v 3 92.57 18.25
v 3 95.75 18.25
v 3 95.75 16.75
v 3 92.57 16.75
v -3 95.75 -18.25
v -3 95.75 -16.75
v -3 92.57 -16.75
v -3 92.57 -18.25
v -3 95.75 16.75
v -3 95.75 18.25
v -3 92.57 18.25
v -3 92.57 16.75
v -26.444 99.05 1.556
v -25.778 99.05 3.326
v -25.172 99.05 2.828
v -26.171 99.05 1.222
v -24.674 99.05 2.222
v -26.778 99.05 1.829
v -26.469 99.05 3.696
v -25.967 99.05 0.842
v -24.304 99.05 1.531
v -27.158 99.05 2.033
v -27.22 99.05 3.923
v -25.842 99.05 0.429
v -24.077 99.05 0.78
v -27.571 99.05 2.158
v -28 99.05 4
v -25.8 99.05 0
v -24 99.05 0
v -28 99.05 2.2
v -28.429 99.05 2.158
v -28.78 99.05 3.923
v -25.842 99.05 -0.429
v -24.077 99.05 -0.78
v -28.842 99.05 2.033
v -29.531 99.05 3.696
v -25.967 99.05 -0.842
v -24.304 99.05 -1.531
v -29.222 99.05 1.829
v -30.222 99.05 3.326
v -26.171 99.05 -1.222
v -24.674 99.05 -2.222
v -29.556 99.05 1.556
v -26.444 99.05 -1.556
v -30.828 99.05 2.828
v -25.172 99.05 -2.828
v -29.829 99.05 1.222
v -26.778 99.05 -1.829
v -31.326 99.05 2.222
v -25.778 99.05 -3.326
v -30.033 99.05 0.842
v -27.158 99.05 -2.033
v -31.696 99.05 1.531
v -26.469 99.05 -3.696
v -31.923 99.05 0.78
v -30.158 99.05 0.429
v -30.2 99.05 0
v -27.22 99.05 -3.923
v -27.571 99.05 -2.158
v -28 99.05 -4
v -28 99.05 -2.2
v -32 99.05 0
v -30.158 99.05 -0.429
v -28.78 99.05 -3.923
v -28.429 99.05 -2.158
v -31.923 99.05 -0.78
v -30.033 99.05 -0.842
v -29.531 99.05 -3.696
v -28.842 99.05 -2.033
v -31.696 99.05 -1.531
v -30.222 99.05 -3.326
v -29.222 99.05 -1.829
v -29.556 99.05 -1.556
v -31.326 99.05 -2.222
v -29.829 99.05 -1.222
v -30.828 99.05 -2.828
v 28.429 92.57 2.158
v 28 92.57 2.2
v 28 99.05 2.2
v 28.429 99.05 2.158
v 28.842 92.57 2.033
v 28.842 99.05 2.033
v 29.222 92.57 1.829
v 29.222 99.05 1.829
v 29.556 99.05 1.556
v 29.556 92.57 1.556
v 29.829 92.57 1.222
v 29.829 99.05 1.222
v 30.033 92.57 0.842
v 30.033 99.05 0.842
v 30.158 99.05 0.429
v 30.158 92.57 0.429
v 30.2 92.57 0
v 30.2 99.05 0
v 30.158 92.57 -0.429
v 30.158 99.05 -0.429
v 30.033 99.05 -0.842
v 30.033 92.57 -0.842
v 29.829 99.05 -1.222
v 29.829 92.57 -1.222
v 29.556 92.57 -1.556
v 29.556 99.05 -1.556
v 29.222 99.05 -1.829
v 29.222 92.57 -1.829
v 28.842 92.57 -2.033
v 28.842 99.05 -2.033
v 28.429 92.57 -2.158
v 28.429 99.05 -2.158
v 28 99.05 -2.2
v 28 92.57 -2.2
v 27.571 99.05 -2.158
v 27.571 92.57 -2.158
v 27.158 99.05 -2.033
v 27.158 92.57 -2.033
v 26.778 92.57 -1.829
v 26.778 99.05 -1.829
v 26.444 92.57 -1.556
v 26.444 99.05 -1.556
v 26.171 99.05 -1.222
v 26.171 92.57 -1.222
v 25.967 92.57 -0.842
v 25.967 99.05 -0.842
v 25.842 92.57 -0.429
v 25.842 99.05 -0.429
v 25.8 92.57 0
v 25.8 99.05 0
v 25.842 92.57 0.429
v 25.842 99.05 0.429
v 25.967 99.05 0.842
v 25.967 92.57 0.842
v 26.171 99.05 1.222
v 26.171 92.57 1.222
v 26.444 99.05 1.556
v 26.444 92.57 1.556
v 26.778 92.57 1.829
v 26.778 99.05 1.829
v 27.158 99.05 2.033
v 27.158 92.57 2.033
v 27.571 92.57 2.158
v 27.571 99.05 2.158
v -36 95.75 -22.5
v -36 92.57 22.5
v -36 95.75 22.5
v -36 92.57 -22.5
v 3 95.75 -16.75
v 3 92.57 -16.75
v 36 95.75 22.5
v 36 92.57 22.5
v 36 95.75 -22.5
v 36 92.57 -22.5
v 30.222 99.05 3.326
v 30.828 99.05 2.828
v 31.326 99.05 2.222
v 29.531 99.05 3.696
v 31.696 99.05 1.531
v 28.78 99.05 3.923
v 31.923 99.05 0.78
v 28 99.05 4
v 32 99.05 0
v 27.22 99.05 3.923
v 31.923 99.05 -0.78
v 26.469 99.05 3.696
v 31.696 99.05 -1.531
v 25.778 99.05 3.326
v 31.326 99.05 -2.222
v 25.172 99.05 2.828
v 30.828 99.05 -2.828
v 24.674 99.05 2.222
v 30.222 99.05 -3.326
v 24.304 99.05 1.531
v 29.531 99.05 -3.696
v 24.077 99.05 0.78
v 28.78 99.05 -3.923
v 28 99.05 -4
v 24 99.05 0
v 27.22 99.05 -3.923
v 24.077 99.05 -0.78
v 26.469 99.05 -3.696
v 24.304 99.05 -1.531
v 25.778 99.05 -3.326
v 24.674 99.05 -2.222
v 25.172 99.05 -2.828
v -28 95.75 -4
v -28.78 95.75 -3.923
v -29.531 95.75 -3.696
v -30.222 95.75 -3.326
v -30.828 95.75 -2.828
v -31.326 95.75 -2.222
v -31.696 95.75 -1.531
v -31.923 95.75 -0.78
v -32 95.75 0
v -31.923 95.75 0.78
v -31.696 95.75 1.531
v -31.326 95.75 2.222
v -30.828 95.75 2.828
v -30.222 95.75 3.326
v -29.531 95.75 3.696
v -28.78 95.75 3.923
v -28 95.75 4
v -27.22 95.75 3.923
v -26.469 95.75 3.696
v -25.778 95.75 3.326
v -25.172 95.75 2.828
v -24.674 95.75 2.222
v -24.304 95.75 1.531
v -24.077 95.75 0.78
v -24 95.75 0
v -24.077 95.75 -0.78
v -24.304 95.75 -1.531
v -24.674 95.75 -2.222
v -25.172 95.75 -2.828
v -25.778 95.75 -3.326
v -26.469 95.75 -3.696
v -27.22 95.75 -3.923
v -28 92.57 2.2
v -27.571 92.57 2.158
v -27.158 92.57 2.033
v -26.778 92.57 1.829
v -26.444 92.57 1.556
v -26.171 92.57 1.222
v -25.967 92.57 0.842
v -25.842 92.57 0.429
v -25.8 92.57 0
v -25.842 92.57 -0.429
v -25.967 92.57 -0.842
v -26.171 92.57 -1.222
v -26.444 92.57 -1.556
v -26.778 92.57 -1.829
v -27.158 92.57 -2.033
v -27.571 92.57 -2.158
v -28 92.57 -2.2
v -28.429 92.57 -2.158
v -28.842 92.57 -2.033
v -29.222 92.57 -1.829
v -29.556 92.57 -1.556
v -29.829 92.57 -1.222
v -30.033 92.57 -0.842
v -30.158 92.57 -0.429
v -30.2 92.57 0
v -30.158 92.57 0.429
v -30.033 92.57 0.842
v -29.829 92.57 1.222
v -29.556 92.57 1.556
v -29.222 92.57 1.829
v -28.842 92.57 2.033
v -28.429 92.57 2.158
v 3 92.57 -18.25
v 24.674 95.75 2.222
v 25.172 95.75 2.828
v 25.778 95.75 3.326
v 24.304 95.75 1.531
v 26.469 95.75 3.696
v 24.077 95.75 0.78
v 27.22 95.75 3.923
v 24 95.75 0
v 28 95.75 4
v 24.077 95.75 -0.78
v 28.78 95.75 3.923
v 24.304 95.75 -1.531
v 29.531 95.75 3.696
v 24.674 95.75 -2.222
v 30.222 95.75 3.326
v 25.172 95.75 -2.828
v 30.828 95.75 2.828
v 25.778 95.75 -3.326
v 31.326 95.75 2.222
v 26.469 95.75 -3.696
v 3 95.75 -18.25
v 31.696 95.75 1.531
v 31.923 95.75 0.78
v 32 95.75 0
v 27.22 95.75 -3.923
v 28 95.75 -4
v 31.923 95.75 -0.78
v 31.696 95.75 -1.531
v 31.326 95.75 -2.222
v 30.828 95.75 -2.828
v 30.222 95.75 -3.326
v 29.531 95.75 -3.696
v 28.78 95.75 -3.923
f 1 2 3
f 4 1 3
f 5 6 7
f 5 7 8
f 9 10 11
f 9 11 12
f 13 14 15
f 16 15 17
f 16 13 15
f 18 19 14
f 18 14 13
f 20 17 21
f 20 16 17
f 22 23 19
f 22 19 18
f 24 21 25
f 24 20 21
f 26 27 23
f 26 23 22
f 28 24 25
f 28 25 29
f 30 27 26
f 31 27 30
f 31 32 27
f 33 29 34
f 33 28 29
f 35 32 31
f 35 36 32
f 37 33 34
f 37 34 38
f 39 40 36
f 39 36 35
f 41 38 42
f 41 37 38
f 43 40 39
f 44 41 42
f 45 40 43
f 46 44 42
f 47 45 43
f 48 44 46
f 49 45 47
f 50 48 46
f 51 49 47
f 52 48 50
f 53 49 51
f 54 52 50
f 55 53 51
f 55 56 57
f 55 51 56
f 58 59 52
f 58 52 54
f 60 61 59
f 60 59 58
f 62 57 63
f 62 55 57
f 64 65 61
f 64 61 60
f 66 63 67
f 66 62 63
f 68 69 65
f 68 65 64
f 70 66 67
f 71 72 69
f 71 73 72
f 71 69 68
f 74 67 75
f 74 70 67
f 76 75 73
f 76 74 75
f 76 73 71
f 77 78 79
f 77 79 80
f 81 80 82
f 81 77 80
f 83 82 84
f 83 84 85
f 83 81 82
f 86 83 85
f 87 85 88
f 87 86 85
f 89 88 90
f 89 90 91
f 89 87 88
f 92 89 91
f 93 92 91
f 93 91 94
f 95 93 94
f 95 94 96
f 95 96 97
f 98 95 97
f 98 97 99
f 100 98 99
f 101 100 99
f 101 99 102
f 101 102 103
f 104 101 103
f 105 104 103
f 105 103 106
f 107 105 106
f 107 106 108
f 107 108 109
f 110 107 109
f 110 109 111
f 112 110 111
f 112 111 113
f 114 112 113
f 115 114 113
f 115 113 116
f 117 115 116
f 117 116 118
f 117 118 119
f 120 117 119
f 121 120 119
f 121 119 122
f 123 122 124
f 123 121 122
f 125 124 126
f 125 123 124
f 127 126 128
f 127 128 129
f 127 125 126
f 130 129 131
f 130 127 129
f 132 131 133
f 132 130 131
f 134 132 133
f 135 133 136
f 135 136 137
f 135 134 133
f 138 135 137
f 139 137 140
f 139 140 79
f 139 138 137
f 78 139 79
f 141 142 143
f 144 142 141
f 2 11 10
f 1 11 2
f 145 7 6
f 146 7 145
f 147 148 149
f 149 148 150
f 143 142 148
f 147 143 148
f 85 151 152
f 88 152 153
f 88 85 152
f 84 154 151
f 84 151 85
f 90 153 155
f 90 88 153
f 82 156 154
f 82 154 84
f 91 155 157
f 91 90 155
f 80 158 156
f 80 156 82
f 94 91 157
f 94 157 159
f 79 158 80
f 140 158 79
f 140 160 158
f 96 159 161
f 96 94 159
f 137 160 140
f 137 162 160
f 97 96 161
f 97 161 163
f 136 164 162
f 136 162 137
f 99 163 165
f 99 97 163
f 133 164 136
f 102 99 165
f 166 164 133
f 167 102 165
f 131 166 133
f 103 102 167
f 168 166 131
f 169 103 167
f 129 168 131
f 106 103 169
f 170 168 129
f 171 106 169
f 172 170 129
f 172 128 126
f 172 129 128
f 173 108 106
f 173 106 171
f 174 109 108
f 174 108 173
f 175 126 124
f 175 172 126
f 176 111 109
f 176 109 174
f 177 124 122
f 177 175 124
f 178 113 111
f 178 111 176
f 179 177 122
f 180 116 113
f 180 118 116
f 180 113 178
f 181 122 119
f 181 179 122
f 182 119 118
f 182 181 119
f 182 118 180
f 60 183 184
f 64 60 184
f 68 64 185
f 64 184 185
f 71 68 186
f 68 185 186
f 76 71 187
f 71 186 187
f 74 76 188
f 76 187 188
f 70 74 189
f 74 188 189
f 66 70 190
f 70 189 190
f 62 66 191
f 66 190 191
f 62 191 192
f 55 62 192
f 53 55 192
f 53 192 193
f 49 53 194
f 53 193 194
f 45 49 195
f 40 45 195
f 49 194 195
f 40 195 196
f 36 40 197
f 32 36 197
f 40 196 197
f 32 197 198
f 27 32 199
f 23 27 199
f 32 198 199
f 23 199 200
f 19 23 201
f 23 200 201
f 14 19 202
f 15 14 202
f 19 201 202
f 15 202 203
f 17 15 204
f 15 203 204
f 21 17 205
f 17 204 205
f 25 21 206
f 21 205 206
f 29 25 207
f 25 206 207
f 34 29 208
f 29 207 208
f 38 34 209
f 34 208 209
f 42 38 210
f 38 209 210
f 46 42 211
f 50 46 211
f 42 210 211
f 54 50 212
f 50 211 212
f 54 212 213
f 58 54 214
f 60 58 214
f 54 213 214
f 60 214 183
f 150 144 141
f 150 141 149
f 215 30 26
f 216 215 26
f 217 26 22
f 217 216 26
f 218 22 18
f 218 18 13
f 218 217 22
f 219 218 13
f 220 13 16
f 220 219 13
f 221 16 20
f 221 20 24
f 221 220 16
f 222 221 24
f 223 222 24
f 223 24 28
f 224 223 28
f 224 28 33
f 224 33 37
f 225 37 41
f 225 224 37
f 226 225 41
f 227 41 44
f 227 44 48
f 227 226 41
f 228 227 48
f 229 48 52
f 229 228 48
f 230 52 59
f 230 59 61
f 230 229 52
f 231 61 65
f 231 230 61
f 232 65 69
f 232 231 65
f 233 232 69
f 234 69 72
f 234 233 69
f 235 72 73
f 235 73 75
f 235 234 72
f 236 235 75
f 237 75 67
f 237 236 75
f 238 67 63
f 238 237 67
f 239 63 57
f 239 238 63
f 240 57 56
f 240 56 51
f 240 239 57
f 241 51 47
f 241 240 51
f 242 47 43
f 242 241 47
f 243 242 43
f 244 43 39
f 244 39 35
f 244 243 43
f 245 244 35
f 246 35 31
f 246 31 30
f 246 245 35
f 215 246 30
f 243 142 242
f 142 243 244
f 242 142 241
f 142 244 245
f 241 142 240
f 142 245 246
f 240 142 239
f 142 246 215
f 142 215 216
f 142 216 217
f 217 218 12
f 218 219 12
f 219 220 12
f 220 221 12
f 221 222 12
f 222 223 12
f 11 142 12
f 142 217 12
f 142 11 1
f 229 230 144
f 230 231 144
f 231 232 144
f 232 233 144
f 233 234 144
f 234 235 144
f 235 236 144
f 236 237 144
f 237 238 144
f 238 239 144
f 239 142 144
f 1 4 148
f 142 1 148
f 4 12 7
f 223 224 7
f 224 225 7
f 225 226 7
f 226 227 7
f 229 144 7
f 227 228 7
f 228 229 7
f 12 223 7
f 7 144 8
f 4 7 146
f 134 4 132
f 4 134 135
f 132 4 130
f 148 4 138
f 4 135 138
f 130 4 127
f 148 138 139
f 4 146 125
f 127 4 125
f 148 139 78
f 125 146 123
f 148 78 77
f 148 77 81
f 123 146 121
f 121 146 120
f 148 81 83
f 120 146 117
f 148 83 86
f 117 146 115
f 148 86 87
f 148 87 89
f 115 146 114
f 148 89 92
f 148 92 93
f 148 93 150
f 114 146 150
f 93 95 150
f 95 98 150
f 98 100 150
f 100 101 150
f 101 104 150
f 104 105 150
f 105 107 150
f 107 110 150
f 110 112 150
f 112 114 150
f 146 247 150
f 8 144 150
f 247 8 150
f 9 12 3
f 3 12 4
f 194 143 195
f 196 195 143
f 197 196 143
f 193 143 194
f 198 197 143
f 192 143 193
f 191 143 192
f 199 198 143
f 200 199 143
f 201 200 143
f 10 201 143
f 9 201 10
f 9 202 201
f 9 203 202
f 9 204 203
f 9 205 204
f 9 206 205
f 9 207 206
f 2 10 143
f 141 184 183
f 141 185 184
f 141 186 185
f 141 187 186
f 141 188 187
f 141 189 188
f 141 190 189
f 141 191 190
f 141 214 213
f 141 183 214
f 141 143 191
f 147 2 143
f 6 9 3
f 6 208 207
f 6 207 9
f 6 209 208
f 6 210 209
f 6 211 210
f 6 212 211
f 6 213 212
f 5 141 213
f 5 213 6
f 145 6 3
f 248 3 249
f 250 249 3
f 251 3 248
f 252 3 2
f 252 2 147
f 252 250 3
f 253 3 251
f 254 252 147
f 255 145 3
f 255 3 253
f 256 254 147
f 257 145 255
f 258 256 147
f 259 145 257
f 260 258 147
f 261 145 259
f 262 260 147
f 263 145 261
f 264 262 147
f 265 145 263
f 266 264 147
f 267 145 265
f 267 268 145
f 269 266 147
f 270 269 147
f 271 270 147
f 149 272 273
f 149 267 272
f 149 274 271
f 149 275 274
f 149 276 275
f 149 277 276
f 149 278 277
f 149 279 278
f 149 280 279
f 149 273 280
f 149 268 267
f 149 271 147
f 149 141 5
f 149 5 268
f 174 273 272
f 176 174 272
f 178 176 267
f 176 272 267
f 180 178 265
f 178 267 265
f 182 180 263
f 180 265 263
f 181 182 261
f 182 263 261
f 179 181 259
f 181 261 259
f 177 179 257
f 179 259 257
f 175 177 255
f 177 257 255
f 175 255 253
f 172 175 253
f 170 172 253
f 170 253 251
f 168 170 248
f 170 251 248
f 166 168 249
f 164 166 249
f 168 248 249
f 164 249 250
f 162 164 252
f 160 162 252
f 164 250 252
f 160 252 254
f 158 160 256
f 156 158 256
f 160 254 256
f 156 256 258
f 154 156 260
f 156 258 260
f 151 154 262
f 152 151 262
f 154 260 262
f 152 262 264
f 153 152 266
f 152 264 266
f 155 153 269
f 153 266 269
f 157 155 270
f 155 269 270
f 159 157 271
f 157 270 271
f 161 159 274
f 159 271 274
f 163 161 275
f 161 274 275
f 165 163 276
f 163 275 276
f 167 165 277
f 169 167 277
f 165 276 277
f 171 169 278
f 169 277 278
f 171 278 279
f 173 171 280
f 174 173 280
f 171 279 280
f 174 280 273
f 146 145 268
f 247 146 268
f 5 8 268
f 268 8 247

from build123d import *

# Parameters (mm, degrees)
PLATE_START      = 92.57
PLATE_SKETCH_W   = 72
PLATE_SKETCH_H   = 45
PLATE_SKETCH_R   = 2.2
PLATE_SKETCH_W_2 = 6
PLATE_SKETCH_H_2 = 1.5
PLATE_DEPTH      = 3.18
PADS_START       = 95.75
PADS_SKETCH_R    = 4
PADS_SKETCH_R_2  = 2.2
PADS_DEPTH       = 3.3


with BuildPart() as part:
    # Plate Sketch → Plate (new body)
    with BuildSketch(Plane(origin=(0, 0, 0), x_dir=(1, 0, 0), z_dir=(0, 1, 0)).offset(PLATE_START)):
        Rectangle(PLATE_SKETCH_W, PLATE_SKETCH_H)
        with Locations((-28, 0)):
            Circle(PLATE_SKETCH_R, mode=Mode.SUBTRACT)
        with Locations((28, 0)):
            Circle(PLATE_SKETCH_R, mode=Mode.SUBTRACT)
        with Locations((0, 17.5)):
            Rectangle(PLATE_SKETCH_W_2, PLATE_SKETCH_H_2, mode=Mode.SUBTRACT)
        with Locations((0, -17.5)):
            Rectangle(PLATE_SKETCH_W_2, PLATE_SKETCH_H_2, mode=Mode.SUBTRACT)
    extrude(amount=PLATE_DEPTH)

    # Pads Sketch → Pads (add)
    # profile 1 of 2: a face of its own
    with BuildSketch(Plane(origin=(0, 0, 0), x_dir=(1, 0, 0), z_dir=(0, 1, 0)).offset(PADS_START)):
        with Locations((-28, 0)):
            Circle(PADS_SKETCH_R)
        with Locations((-28, 0)):
            Circle(PADS_SKETCH_R_2, mode=Mode.SUBTRACT)
    # profile 2 of 2: a face of its own
    with BuildSketch(Plane(origin=(0, 0, 0), x_dir=(1, 0, 0), z_dir=(0, 1, 0)).offset(PADS_START)):
        with Locations((28, 0)):
            Circle(PADS_SKETCH_R)
        with Locations((28, 0)):
            Circle(PADS_SKETCH_R_2, mode=Mode.SUBTRACT)
    extrude(amount=PADS_DEPTH)


solid = part.part
